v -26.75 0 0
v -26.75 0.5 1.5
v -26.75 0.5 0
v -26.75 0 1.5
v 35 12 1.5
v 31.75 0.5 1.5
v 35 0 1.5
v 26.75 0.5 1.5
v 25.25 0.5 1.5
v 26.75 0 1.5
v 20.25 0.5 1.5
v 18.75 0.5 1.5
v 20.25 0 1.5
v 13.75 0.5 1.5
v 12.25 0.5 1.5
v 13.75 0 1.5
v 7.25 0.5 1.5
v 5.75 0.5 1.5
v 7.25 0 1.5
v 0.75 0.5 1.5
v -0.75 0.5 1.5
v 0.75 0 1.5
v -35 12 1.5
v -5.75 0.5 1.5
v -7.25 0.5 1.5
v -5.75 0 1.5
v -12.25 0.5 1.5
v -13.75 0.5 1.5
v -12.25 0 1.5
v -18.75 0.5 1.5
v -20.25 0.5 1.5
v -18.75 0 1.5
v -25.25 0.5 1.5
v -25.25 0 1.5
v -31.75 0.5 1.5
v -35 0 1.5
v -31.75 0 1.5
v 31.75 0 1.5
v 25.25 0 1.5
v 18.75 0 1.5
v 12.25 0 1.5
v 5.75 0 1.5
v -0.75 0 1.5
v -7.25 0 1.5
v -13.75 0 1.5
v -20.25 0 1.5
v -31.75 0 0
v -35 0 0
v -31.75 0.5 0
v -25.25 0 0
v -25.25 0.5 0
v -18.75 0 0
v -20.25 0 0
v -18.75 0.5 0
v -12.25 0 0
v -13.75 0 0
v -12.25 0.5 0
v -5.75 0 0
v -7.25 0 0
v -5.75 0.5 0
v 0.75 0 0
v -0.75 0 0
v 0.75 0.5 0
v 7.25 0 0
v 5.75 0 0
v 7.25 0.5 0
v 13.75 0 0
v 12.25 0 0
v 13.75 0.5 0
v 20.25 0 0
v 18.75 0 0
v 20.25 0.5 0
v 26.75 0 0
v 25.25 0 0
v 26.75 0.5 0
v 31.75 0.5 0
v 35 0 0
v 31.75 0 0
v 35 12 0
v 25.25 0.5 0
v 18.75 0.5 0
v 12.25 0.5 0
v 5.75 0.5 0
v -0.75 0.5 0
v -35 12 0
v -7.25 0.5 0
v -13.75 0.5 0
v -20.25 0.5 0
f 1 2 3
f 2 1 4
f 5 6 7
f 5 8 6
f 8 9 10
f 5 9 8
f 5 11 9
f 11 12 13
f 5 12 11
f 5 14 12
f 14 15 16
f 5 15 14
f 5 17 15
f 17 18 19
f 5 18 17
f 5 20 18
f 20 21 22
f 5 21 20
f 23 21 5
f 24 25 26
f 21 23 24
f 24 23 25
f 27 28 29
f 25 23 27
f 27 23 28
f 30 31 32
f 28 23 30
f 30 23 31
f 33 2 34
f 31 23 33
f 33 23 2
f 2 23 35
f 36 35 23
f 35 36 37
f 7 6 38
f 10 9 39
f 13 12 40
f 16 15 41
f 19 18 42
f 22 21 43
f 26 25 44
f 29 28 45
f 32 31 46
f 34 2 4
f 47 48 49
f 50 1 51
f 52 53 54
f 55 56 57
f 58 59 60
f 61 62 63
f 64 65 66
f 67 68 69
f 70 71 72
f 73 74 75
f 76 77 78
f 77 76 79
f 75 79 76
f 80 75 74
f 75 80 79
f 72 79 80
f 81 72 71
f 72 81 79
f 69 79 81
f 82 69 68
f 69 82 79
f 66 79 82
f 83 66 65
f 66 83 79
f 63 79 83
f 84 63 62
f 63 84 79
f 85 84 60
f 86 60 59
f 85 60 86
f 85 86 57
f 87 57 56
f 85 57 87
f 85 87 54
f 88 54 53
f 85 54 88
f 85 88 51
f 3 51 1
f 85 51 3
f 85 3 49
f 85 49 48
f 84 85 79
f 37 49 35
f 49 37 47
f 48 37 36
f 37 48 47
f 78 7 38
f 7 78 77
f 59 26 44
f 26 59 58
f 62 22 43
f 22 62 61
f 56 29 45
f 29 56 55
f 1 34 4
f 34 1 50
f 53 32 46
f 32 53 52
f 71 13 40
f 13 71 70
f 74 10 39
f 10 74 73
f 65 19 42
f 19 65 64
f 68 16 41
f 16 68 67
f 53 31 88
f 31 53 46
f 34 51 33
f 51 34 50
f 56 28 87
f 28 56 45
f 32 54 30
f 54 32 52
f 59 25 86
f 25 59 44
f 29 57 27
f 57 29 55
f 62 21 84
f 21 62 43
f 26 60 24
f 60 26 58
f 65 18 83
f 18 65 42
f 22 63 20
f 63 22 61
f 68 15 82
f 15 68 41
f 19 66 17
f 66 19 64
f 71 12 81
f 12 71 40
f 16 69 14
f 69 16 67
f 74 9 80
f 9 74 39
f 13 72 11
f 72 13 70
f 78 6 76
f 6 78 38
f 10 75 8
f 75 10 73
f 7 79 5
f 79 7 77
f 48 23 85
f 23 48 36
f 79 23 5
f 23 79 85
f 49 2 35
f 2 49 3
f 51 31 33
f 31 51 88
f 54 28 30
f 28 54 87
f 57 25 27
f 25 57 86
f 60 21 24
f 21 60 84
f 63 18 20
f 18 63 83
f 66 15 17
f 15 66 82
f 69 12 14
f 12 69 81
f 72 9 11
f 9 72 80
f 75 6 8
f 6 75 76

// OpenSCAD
// 10-well comb for casting agarose gels
// Print orientation: flat on bed, teeth pointing down (-Y)

// ---- Parameters ----
plate_t      = 1.5;   // plate thickness (Z)
spine_len    = 70;    // spine length along X
spine_w      = 12;    // spine width along Y
tooth_n      = 10;    // number of teeth
tooth_w      = 5.0;   // tooth width along X
tooth_len    = 12;    // tooth length along Y
tooth_gap    = 1.5;   // gap between neighbouring teeth along X
eps          = 0.5;   // cutter overshoot past faces

$fn = 64;

// ---- Derived ----
pitch   = tooth_w + tooth_gap;            // centre-to-centre spacing
x0      = -(tooth_n - 1) * pitch / 2;     // first tooth centre (row centred)

// ---- Model ----
difference() {
    union() {
        // Spine (back bar)
        translate([-spine_len / 2, 0, 0])
            cube([spine_len, spine_w, plate_t]);

        // Teeth hanging from -Y edge
        for (i = [0 : tooth_n - 1])
            translate([x0 + i * pitch - tooth_w / 2, -tooth_len, 0])
                cube([tooth_w, tooth_len, plate_t]);
    }

    // Through-cut each tooth (extends past top and bottom faces)
    for (i = [0 : tooth_n - 1])
        translate([x0 + i * pitch - tooth_w / 2, -tooth_len - eps, -eps])
            cube([tooth_w, tooth_len + 2 * eps, plate_t + 2 * eps]);
}
